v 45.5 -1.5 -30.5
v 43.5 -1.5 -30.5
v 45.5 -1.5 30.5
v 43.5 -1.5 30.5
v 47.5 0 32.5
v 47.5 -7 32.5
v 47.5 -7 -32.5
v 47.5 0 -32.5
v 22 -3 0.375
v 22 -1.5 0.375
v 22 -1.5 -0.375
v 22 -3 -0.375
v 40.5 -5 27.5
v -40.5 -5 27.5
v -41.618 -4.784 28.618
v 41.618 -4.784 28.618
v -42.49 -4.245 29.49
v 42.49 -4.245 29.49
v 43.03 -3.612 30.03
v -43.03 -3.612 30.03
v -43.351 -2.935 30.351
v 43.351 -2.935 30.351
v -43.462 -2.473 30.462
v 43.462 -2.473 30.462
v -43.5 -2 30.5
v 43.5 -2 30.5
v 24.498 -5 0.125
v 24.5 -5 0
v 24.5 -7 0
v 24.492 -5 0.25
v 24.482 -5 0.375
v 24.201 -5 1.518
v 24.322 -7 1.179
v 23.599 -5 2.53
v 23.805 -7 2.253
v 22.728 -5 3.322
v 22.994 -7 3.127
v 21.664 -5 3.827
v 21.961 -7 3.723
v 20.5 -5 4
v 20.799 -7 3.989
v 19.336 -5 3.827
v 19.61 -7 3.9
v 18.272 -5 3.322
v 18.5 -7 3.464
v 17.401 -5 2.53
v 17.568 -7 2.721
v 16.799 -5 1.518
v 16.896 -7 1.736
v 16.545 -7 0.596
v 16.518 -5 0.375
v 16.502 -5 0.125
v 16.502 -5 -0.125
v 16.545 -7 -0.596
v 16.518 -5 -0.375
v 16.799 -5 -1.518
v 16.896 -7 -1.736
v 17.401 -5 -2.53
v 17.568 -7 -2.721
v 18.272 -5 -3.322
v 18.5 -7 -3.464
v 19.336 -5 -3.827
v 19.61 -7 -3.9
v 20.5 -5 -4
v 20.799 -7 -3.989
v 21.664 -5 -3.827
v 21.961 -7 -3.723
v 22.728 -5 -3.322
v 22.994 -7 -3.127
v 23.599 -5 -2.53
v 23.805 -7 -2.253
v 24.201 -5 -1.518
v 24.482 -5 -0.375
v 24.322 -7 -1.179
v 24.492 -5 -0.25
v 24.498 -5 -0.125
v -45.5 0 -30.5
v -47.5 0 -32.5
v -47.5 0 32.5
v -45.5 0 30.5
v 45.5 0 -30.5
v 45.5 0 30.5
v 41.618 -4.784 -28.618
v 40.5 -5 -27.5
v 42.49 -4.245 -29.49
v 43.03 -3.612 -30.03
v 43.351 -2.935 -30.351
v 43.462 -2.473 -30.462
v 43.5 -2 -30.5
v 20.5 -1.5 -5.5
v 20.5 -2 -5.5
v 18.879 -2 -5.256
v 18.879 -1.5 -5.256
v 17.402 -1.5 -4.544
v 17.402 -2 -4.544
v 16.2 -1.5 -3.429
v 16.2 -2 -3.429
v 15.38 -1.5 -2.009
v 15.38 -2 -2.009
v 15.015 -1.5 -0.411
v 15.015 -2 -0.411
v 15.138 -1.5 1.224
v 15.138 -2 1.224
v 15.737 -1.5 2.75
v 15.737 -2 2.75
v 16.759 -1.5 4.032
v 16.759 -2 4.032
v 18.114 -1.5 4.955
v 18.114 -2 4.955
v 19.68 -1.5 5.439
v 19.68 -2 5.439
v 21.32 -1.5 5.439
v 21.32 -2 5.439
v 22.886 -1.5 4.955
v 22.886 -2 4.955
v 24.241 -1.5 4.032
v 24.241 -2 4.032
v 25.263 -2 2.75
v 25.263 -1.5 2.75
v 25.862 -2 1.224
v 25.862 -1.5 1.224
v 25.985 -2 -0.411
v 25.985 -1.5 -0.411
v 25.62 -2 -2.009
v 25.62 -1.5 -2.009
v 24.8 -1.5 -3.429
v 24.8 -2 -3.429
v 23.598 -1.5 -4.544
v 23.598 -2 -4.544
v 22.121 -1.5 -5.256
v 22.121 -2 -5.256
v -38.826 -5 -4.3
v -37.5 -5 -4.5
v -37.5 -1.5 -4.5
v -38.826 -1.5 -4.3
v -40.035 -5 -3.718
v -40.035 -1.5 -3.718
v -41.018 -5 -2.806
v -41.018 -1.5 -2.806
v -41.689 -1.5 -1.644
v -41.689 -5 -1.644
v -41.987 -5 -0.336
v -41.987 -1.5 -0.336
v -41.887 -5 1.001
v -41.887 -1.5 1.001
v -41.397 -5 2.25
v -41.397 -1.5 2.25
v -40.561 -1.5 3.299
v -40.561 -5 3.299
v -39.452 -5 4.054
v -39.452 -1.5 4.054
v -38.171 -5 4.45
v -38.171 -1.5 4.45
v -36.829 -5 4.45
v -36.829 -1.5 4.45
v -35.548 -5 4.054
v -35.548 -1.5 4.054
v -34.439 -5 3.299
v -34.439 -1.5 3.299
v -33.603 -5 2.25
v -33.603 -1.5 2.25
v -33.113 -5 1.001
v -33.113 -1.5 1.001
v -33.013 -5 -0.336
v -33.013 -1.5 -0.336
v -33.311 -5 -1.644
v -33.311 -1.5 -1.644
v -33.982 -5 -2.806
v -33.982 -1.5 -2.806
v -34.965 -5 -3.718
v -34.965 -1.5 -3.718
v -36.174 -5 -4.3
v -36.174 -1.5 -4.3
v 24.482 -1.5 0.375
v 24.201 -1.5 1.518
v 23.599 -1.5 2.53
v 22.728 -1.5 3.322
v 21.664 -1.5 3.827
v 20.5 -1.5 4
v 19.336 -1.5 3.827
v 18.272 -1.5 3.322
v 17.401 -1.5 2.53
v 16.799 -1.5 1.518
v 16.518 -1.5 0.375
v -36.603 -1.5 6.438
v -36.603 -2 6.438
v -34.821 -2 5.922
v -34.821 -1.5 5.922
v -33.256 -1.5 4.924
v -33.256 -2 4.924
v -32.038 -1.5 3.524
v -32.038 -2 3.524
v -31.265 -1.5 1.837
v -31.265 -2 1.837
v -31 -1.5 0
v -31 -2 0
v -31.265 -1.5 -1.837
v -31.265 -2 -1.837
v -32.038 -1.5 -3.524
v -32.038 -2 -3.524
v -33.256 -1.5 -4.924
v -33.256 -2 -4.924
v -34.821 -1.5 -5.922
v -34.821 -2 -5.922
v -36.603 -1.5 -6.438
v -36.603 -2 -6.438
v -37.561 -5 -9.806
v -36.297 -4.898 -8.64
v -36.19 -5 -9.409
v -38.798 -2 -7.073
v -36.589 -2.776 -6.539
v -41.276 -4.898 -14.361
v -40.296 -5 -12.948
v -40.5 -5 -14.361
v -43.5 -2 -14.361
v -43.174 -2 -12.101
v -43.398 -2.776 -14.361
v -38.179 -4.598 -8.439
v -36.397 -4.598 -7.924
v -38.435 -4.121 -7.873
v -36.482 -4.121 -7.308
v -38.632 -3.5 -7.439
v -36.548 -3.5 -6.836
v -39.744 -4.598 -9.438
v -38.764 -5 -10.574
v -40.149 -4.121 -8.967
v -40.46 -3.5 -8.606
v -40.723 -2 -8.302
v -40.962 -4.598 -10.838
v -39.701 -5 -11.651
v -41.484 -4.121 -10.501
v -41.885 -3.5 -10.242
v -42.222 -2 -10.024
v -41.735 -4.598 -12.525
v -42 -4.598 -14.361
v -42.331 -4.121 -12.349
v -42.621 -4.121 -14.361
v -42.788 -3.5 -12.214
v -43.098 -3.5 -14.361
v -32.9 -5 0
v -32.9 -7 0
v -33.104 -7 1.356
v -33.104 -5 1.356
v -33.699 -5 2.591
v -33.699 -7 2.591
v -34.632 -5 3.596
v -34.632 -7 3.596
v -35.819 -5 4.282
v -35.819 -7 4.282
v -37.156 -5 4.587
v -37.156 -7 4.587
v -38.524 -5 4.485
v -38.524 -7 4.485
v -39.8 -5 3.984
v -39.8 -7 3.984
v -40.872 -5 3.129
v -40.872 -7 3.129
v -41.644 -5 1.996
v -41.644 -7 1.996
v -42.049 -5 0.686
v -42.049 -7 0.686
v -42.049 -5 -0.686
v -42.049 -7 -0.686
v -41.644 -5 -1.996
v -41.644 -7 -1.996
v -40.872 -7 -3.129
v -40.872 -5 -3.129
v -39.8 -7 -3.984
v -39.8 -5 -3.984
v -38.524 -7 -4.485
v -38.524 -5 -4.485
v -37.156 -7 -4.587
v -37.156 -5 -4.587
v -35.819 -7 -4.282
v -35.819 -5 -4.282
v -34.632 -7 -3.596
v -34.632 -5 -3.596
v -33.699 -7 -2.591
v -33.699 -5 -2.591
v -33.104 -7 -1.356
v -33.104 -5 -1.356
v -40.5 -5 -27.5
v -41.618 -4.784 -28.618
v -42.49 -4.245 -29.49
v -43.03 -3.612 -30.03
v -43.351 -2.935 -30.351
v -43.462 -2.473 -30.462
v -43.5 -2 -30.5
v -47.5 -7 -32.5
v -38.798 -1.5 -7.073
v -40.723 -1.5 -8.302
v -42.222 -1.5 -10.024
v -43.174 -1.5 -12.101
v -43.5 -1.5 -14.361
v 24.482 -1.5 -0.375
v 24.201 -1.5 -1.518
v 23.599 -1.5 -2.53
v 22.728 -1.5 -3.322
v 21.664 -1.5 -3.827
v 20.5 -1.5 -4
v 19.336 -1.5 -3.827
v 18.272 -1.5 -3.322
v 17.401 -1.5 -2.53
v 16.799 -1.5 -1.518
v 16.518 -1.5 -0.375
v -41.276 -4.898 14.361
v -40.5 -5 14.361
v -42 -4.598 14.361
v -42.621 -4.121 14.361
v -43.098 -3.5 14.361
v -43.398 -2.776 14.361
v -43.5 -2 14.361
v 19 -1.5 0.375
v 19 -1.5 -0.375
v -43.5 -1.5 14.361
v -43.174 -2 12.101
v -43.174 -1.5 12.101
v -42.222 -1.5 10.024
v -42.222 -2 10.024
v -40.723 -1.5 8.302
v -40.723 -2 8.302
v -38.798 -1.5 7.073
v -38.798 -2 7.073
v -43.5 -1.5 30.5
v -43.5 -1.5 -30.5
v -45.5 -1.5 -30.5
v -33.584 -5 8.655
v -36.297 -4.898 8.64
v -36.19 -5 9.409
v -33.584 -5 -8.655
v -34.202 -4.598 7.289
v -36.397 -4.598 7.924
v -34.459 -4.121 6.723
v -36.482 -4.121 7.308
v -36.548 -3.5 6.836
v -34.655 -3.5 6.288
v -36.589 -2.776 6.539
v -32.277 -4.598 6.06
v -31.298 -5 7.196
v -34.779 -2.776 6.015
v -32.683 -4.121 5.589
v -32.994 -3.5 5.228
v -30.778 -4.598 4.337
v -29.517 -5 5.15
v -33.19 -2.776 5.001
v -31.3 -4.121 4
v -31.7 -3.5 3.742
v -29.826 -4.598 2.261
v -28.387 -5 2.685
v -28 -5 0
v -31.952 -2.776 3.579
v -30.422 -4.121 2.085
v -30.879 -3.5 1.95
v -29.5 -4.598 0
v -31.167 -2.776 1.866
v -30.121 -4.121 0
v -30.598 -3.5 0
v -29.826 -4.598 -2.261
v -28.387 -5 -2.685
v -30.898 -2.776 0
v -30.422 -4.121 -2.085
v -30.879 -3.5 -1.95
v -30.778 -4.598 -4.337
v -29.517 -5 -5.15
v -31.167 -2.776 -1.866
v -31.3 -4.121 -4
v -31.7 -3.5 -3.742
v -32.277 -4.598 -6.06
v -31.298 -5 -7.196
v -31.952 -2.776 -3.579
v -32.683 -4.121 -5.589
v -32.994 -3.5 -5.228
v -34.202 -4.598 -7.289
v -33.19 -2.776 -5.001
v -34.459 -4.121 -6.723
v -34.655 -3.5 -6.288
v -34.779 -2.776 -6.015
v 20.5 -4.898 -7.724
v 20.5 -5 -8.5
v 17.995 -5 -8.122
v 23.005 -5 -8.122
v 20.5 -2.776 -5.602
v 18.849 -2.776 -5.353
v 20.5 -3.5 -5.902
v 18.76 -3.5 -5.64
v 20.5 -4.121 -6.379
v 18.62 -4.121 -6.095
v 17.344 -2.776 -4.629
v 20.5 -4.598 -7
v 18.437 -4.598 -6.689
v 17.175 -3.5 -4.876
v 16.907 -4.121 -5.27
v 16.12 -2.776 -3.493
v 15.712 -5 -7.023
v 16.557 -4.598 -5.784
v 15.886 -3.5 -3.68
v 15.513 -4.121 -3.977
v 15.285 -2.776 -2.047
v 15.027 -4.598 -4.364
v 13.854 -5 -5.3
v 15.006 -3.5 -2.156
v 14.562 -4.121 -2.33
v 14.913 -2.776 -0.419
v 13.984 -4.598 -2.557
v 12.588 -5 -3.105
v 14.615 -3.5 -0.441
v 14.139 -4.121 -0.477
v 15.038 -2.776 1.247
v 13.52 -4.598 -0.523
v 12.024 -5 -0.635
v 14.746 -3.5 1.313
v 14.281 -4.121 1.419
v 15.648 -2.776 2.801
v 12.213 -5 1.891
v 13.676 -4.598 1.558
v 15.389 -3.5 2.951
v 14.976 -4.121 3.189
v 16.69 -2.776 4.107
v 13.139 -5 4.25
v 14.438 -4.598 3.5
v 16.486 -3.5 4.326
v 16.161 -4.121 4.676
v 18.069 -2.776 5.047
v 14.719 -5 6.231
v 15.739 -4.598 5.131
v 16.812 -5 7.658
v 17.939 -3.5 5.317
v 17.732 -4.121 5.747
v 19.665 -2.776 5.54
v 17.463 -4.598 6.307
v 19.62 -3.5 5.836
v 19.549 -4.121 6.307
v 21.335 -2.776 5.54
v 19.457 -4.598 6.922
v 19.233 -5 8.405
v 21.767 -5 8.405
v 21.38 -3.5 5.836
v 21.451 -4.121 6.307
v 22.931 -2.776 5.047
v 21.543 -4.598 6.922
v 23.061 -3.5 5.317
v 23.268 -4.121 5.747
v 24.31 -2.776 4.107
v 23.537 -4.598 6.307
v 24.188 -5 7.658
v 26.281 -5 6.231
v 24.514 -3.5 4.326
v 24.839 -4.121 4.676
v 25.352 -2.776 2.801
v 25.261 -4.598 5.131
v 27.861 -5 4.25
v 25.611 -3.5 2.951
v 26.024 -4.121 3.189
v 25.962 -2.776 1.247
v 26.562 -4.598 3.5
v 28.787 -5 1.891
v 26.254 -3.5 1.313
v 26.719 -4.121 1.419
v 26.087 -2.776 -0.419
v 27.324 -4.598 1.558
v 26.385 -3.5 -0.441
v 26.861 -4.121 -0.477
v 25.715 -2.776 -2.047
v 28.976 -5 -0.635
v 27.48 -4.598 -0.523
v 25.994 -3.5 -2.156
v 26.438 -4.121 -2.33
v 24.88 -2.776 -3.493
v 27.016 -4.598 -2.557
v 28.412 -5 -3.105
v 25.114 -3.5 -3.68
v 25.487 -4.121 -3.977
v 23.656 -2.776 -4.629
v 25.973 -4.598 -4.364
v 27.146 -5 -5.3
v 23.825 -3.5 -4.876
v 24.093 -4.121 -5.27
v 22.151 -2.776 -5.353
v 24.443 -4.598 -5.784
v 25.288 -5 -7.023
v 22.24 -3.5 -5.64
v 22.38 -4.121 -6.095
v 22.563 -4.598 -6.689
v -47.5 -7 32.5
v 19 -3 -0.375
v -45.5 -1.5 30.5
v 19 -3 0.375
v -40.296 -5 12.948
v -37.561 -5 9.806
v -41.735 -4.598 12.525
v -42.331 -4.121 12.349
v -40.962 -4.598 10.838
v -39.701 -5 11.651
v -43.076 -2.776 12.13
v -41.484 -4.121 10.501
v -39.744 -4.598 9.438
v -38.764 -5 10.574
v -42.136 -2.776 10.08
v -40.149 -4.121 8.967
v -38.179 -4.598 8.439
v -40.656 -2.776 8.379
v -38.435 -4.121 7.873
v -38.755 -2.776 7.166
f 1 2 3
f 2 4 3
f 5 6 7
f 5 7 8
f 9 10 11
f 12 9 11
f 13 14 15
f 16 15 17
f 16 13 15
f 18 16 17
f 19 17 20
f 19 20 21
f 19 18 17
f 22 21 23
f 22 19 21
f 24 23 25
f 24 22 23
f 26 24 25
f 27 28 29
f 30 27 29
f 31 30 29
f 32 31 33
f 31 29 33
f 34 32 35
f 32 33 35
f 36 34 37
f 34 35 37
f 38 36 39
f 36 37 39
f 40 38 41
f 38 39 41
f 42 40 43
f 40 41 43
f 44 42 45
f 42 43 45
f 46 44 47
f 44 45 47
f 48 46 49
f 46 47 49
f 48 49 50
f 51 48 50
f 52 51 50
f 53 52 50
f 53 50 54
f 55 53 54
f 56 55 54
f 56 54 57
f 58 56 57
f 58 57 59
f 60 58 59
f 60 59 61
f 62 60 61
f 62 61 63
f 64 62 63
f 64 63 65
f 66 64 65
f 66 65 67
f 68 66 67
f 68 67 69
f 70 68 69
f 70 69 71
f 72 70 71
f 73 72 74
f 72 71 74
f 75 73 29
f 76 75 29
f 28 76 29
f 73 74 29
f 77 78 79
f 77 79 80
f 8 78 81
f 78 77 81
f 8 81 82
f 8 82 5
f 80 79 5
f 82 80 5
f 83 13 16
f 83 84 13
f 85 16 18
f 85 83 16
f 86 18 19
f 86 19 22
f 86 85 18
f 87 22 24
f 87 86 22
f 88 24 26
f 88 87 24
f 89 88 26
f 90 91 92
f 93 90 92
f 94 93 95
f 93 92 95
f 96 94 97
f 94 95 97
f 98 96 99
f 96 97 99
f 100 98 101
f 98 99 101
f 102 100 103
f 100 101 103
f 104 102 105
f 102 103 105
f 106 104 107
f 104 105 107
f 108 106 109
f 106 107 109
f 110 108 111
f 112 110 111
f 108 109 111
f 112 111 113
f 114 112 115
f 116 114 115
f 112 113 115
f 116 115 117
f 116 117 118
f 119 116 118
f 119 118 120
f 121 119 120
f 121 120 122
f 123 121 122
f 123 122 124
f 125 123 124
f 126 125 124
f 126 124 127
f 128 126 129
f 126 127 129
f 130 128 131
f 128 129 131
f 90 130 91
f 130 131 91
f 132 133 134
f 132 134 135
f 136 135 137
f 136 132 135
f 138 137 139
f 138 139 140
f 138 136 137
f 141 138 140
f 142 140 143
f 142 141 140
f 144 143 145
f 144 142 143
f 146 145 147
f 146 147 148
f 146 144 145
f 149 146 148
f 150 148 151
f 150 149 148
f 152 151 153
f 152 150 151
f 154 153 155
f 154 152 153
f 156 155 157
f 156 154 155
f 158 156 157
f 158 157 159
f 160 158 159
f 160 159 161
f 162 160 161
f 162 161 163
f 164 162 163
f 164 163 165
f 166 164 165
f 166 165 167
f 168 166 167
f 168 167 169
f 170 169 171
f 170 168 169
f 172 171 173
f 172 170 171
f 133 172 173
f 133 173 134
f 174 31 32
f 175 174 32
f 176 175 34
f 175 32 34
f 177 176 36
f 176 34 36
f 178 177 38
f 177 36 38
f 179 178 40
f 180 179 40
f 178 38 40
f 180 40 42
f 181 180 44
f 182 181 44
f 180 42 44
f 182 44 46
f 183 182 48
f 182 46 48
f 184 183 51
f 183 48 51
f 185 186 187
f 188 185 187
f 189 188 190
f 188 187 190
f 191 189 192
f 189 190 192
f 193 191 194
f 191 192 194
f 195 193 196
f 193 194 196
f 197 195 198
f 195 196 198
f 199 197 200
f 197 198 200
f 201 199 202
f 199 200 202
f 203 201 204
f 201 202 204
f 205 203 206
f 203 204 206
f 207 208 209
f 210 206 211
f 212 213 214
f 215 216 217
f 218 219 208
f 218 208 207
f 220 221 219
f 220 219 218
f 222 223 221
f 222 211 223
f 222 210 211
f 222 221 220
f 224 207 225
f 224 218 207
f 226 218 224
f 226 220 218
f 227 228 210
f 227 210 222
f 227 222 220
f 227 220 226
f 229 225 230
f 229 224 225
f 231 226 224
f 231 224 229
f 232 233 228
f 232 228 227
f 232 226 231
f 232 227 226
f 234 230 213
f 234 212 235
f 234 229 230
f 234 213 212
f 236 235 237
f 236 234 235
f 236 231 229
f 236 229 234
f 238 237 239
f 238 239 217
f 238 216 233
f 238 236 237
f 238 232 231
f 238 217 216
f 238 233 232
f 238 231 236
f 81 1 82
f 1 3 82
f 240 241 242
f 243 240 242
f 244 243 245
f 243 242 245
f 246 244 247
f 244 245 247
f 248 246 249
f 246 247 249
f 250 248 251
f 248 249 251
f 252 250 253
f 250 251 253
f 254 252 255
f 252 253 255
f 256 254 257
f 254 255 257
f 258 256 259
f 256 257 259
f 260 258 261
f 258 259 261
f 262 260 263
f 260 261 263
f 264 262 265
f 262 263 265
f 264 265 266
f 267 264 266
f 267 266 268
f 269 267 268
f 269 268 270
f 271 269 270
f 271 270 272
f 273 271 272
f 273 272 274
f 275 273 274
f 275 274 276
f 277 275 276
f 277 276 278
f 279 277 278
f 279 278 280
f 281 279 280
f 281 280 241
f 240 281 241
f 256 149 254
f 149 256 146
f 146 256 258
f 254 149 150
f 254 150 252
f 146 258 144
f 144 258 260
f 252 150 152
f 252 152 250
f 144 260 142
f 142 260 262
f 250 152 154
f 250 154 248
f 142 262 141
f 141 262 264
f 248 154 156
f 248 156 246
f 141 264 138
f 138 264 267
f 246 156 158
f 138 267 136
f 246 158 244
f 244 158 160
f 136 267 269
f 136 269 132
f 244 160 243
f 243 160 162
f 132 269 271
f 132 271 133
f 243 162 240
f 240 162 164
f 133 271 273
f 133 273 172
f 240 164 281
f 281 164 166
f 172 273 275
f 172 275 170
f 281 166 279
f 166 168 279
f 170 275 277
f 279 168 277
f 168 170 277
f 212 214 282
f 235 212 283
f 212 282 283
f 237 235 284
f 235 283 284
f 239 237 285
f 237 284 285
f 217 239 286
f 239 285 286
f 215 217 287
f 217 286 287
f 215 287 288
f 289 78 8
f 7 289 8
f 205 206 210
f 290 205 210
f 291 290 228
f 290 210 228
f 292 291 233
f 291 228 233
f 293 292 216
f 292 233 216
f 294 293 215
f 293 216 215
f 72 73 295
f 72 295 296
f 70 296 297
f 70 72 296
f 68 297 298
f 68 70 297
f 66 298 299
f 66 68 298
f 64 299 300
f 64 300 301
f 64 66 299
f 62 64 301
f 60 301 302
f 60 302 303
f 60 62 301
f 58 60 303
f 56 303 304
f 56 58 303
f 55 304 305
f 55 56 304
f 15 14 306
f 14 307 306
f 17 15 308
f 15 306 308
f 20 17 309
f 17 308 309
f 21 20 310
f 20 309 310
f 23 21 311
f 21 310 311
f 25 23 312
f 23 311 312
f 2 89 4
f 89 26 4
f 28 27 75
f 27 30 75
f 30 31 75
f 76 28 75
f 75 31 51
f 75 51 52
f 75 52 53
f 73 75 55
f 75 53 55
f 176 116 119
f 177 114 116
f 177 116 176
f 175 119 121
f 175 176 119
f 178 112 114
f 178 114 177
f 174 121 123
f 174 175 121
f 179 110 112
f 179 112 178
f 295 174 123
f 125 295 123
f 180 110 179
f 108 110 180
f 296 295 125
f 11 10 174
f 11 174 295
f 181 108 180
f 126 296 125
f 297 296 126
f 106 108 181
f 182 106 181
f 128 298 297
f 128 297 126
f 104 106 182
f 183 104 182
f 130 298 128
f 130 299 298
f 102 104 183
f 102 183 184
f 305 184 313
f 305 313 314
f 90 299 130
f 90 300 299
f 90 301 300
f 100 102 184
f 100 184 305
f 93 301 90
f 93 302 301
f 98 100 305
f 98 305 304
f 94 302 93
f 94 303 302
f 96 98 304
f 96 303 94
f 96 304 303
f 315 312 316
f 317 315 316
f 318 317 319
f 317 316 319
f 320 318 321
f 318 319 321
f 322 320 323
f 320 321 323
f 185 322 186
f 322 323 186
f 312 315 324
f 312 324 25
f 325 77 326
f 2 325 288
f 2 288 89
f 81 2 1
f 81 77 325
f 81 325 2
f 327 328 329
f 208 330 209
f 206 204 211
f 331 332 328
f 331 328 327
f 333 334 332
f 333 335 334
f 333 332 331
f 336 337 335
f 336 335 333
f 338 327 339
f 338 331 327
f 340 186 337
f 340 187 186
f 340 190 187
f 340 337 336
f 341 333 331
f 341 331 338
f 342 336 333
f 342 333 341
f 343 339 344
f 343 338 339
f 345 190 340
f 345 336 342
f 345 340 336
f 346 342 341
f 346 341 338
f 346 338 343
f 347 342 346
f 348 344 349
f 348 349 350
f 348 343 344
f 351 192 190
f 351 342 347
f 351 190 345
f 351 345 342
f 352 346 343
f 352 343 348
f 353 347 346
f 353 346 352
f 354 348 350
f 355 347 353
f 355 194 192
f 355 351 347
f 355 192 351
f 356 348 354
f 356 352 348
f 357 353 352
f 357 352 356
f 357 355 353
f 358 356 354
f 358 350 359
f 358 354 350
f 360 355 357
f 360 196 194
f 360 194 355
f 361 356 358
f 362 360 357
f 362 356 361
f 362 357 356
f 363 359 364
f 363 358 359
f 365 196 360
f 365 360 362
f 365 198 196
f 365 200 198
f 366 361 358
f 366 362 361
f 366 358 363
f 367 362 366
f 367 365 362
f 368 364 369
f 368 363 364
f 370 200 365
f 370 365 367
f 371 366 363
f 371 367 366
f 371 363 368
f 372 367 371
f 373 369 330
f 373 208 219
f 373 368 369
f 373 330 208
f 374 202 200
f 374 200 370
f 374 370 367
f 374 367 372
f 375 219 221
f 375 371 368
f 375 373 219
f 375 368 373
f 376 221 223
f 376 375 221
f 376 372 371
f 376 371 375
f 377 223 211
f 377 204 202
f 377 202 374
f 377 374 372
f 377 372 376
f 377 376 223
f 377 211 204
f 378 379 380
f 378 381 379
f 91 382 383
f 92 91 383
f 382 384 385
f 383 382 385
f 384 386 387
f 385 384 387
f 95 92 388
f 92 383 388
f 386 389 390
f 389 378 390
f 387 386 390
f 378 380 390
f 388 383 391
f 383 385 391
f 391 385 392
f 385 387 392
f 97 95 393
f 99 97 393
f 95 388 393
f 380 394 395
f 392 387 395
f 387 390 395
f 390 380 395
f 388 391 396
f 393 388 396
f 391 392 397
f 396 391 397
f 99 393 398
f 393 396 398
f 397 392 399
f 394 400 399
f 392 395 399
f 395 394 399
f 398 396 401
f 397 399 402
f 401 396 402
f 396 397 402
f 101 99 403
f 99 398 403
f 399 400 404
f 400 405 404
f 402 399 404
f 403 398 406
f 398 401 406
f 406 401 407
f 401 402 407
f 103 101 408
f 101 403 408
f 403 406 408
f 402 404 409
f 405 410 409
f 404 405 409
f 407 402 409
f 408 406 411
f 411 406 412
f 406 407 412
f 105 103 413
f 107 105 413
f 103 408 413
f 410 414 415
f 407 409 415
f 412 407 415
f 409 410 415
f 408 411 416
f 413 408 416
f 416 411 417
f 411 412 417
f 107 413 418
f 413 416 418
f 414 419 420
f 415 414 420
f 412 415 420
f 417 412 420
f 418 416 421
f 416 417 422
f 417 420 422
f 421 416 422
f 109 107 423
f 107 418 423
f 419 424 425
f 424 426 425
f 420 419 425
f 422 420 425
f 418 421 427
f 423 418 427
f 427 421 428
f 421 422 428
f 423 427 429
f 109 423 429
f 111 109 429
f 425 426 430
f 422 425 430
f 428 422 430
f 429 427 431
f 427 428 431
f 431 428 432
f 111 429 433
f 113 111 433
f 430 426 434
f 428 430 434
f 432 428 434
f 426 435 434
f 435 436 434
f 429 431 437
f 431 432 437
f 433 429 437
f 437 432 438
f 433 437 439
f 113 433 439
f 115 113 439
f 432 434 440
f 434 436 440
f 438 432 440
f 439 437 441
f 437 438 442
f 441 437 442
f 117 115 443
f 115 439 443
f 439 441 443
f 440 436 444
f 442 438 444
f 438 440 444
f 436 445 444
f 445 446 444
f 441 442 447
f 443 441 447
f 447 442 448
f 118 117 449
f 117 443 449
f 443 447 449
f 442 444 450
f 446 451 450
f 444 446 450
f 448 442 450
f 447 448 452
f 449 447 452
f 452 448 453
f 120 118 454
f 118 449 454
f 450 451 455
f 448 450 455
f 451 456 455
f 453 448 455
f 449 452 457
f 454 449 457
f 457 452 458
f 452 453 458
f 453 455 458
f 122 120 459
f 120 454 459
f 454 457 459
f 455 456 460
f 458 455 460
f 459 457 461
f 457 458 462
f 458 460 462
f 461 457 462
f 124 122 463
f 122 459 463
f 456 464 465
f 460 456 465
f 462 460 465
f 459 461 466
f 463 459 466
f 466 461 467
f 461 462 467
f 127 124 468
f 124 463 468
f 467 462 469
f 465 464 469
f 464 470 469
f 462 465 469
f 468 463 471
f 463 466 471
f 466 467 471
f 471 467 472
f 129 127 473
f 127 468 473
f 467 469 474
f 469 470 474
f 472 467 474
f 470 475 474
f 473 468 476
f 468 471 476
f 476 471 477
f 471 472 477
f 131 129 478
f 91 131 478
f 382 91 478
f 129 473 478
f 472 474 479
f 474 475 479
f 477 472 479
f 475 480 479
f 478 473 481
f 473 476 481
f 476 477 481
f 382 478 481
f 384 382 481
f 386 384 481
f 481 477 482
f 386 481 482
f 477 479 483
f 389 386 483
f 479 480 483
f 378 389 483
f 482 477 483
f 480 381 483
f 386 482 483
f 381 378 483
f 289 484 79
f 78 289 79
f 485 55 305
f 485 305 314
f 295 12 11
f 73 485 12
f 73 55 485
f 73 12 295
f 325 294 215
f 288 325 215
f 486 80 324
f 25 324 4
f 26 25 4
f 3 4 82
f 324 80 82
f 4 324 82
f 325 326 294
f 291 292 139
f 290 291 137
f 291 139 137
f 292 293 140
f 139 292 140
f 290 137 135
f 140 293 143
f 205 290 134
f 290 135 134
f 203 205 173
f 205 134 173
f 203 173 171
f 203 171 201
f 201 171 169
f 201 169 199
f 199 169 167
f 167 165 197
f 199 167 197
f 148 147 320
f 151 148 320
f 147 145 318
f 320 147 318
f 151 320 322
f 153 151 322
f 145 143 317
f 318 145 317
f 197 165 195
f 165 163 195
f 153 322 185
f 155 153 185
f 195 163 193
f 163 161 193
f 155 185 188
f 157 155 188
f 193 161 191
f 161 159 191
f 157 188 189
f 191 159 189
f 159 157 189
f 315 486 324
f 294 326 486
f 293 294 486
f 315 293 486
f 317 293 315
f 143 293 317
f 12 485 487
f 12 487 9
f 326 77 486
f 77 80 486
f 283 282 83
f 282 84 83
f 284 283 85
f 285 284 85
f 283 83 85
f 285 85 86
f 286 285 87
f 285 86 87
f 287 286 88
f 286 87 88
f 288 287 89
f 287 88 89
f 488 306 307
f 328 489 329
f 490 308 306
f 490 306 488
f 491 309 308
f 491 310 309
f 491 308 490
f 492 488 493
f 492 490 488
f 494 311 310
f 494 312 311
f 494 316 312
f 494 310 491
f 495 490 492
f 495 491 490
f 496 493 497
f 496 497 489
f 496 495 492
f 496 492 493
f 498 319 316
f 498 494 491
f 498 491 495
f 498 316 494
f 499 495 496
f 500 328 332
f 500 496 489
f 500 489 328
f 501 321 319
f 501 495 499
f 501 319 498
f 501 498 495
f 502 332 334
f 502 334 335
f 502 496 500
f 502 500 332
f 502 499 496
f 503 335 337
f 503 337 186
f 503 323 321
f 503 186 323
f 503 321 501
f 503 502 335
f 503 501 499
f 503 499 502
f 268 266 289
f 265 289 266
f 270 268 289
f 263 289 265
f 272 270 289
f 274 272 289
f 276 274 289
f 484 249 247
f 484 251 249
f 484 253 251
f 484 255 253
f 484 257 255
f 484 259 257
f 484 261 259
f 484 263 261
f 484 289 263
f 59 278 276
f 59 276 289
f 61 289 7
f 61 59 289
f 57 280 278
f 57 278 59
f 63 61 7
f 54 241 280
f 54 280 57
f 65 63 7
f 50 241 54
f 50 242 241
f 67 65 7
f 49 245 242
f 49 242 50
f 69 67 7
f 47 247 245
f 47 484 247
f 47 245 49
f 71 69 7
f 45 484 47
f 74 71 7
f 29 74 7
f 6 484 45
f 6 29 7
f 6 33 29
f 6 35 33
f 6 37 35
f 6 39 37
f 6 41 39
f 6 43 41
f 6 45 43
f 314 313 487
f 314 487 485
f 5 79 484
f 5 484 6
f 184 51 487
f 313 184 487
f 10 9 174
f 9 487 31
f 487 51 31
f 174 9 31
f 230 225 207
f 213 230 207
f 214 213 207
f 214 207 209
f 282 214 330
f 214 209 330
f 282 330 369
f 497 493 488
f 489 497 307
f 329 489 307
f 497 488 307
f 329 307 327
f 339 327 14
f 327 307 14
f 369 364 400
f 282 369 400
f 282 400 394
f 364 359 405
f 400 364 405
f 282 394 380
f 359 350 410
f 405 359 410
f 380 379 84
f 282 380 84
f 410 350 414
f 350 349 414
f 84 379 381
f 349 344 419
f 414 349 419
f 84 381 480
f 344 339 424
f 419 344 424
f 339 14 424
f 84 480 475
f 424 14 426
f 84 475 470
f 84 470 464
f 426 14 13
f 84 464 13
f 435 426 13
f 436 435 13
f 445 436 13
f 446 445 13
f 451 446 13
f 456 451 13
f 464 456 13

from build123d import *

# Parameters (mm, degrees)
PCB_STAND_DEPTH     = 30.5
SKETCH3_W           = 95
SKETCH3_H           = 7
EXTRA_BOTTOM_DEPTH  = 2
SENSOR_HOLES_2_R    = 4.6
SENSOR_HOLES_2_R_2  = 4
SENSOR_HOLES_DEPTH  = 58.97844427
SKETCH4_R           = 5.5
SKETCH4_R_2         = 4.5
SENSOR_STANDS_DEPTH = 3.5
FILLET1_R           = 3
SKETCH5_W           = 3
SKETCH5_H           = 0.75
TOF_SLOT_DEPTH      = 1.5


with BuildPart() as part:
    # Master_Geometry → PCB_Stand (new, symmetric)
    with BuildSketch(Plane.XY):
        Polygon((-47.5, -5), (-47.5, 0), (-45.5, 0), (-45.5, -1.5), (-43.5, -1.5), (-43.5, -5), (43.5, -5), (43.5, -1.5), (45.5, -1.5), (45.5, 0), (47.5, 0), (47.5, -5), (47.5, -7), (-47.5, -7), align=None)
    extrude(amount=PCB_STAND_DEPTH, both=True)

    # Sketch3 → Extra_Bottom (add)
    with BuildSketch(Plane.XY.offset(30.5)):
        with Locations((0, -3.5)):
            Rectangle(SKETCH3_W, SKETCH3_H)
    extra_bottom = extrude(amount=EXTRA_BOTTOM_DEPTH)

    # Mirror2: Extra_Bottom across plane
    add(extra_bottom.mirror(Plane.XY))

    # Sensor-Holes 2 → Sensor_Holes (cut, through all)
    with BuildSketch(Plane.XZ.offset(7)):
        with Locations((-37.5, 0)):
            Circle(SENSOR_HOLES_2_R)
        with Locations((20.5, 0)):
            Circle(SENSOR_HOLES_2_R_2)
    extrude(amount=-SENSOR_HOLES_DEPTH, mode=Mode.SUBTRACT)

    # Sketch4 → Sensor_Stands (add)
    # profile 1 of 2: a face of its own
    with BuildSketch(Plane(origin=(0, -5, 0), x_dir=(1, 0, 0), z_dir=(0, 1, 0))):
        with Locations(Location((20.5, 0, 0), (0, 0, 90))):
            Circle(SKETCH4_R)
        with BuildLine():
            Line((16.517616919, 0.375), (24.482383081, 0.375))
            ThreePointArc((24.482383081, 0.375), (20.5, 4), (16.517616919, 0.375))
        make_face(mode=Mode.SUBTRACT)
        with BuildLine():
            Line((16.517616919, -0.375), (24.482383081, -0.375))
            ThreePointArc((24.482383081, -0.375), (20.5, -4), (16.517616919, -0.375))
        make_face(mode=Mode.SUBTRACT)
    # profile 2 of 2: a face of its own
    with BuildSketch(Plane(origin=(0, -5, 0), x_dir=(1, 0, 0), z_dir=(0, 1, 0))):
        with BuildLine():
            Line((-43.5, 14.361406616), (-43.5, -14.361406616))
            ThreePointArc((-43.5, -14.361406616), (-41.534384236, -9.109149302), (-36.603448276, -6.437871931))
            ThreePointArc((-36.603448276, -6.437871931), (-31, 0), (-36.603448276, 6.437871931))
            ThreePointArc((-36.603448276, 6.437871931), (-41.534384236, 9.109149302), (-43.5, 14.361406616))
        make_face()
        with Locations(Location((-37.5, 0, 0), (0, 0, 90))):
            Circle(SKETCH4_R_2, mode=Mode.SUBTRACT)
    extrude(amount=SENSOR_STANDS_DEPTH)

    # Fillet1
    fillet1_edges = [part.edges().sort_by_distance(p)[0] for p in [
        (-41.534384236, -5, 9.109149302),
        (-31, -5, 0),
        (-41.534384236, -5, -9.109149302),
        (0, -5, -30.5),
        (-43.5, -5, 22.430703308),
        (43.5, -5, 0),
        (0, -5, 30.5),
        (20.5, -5, 5.5),
        (-43.5, -5, -22.430703308),
    ]]
    fillet(fillet1_edges, radius=FILLET1_R)

    # Sketch5 → ToF_Slot (cut)
    with BuildSketch(Plane(origin=(0, -1.5, 0), x_dir=(1, 0, 0), z_dir=(0, 1, 0))):
        with Locations((20.5, 0)):
            Rectangle(SKETCH5_W, SKETCH5_H)
    extrude(amount=-TOF_SLOT_DEPTH, mode=Mode.SUBTRACT)


solid = part.part
